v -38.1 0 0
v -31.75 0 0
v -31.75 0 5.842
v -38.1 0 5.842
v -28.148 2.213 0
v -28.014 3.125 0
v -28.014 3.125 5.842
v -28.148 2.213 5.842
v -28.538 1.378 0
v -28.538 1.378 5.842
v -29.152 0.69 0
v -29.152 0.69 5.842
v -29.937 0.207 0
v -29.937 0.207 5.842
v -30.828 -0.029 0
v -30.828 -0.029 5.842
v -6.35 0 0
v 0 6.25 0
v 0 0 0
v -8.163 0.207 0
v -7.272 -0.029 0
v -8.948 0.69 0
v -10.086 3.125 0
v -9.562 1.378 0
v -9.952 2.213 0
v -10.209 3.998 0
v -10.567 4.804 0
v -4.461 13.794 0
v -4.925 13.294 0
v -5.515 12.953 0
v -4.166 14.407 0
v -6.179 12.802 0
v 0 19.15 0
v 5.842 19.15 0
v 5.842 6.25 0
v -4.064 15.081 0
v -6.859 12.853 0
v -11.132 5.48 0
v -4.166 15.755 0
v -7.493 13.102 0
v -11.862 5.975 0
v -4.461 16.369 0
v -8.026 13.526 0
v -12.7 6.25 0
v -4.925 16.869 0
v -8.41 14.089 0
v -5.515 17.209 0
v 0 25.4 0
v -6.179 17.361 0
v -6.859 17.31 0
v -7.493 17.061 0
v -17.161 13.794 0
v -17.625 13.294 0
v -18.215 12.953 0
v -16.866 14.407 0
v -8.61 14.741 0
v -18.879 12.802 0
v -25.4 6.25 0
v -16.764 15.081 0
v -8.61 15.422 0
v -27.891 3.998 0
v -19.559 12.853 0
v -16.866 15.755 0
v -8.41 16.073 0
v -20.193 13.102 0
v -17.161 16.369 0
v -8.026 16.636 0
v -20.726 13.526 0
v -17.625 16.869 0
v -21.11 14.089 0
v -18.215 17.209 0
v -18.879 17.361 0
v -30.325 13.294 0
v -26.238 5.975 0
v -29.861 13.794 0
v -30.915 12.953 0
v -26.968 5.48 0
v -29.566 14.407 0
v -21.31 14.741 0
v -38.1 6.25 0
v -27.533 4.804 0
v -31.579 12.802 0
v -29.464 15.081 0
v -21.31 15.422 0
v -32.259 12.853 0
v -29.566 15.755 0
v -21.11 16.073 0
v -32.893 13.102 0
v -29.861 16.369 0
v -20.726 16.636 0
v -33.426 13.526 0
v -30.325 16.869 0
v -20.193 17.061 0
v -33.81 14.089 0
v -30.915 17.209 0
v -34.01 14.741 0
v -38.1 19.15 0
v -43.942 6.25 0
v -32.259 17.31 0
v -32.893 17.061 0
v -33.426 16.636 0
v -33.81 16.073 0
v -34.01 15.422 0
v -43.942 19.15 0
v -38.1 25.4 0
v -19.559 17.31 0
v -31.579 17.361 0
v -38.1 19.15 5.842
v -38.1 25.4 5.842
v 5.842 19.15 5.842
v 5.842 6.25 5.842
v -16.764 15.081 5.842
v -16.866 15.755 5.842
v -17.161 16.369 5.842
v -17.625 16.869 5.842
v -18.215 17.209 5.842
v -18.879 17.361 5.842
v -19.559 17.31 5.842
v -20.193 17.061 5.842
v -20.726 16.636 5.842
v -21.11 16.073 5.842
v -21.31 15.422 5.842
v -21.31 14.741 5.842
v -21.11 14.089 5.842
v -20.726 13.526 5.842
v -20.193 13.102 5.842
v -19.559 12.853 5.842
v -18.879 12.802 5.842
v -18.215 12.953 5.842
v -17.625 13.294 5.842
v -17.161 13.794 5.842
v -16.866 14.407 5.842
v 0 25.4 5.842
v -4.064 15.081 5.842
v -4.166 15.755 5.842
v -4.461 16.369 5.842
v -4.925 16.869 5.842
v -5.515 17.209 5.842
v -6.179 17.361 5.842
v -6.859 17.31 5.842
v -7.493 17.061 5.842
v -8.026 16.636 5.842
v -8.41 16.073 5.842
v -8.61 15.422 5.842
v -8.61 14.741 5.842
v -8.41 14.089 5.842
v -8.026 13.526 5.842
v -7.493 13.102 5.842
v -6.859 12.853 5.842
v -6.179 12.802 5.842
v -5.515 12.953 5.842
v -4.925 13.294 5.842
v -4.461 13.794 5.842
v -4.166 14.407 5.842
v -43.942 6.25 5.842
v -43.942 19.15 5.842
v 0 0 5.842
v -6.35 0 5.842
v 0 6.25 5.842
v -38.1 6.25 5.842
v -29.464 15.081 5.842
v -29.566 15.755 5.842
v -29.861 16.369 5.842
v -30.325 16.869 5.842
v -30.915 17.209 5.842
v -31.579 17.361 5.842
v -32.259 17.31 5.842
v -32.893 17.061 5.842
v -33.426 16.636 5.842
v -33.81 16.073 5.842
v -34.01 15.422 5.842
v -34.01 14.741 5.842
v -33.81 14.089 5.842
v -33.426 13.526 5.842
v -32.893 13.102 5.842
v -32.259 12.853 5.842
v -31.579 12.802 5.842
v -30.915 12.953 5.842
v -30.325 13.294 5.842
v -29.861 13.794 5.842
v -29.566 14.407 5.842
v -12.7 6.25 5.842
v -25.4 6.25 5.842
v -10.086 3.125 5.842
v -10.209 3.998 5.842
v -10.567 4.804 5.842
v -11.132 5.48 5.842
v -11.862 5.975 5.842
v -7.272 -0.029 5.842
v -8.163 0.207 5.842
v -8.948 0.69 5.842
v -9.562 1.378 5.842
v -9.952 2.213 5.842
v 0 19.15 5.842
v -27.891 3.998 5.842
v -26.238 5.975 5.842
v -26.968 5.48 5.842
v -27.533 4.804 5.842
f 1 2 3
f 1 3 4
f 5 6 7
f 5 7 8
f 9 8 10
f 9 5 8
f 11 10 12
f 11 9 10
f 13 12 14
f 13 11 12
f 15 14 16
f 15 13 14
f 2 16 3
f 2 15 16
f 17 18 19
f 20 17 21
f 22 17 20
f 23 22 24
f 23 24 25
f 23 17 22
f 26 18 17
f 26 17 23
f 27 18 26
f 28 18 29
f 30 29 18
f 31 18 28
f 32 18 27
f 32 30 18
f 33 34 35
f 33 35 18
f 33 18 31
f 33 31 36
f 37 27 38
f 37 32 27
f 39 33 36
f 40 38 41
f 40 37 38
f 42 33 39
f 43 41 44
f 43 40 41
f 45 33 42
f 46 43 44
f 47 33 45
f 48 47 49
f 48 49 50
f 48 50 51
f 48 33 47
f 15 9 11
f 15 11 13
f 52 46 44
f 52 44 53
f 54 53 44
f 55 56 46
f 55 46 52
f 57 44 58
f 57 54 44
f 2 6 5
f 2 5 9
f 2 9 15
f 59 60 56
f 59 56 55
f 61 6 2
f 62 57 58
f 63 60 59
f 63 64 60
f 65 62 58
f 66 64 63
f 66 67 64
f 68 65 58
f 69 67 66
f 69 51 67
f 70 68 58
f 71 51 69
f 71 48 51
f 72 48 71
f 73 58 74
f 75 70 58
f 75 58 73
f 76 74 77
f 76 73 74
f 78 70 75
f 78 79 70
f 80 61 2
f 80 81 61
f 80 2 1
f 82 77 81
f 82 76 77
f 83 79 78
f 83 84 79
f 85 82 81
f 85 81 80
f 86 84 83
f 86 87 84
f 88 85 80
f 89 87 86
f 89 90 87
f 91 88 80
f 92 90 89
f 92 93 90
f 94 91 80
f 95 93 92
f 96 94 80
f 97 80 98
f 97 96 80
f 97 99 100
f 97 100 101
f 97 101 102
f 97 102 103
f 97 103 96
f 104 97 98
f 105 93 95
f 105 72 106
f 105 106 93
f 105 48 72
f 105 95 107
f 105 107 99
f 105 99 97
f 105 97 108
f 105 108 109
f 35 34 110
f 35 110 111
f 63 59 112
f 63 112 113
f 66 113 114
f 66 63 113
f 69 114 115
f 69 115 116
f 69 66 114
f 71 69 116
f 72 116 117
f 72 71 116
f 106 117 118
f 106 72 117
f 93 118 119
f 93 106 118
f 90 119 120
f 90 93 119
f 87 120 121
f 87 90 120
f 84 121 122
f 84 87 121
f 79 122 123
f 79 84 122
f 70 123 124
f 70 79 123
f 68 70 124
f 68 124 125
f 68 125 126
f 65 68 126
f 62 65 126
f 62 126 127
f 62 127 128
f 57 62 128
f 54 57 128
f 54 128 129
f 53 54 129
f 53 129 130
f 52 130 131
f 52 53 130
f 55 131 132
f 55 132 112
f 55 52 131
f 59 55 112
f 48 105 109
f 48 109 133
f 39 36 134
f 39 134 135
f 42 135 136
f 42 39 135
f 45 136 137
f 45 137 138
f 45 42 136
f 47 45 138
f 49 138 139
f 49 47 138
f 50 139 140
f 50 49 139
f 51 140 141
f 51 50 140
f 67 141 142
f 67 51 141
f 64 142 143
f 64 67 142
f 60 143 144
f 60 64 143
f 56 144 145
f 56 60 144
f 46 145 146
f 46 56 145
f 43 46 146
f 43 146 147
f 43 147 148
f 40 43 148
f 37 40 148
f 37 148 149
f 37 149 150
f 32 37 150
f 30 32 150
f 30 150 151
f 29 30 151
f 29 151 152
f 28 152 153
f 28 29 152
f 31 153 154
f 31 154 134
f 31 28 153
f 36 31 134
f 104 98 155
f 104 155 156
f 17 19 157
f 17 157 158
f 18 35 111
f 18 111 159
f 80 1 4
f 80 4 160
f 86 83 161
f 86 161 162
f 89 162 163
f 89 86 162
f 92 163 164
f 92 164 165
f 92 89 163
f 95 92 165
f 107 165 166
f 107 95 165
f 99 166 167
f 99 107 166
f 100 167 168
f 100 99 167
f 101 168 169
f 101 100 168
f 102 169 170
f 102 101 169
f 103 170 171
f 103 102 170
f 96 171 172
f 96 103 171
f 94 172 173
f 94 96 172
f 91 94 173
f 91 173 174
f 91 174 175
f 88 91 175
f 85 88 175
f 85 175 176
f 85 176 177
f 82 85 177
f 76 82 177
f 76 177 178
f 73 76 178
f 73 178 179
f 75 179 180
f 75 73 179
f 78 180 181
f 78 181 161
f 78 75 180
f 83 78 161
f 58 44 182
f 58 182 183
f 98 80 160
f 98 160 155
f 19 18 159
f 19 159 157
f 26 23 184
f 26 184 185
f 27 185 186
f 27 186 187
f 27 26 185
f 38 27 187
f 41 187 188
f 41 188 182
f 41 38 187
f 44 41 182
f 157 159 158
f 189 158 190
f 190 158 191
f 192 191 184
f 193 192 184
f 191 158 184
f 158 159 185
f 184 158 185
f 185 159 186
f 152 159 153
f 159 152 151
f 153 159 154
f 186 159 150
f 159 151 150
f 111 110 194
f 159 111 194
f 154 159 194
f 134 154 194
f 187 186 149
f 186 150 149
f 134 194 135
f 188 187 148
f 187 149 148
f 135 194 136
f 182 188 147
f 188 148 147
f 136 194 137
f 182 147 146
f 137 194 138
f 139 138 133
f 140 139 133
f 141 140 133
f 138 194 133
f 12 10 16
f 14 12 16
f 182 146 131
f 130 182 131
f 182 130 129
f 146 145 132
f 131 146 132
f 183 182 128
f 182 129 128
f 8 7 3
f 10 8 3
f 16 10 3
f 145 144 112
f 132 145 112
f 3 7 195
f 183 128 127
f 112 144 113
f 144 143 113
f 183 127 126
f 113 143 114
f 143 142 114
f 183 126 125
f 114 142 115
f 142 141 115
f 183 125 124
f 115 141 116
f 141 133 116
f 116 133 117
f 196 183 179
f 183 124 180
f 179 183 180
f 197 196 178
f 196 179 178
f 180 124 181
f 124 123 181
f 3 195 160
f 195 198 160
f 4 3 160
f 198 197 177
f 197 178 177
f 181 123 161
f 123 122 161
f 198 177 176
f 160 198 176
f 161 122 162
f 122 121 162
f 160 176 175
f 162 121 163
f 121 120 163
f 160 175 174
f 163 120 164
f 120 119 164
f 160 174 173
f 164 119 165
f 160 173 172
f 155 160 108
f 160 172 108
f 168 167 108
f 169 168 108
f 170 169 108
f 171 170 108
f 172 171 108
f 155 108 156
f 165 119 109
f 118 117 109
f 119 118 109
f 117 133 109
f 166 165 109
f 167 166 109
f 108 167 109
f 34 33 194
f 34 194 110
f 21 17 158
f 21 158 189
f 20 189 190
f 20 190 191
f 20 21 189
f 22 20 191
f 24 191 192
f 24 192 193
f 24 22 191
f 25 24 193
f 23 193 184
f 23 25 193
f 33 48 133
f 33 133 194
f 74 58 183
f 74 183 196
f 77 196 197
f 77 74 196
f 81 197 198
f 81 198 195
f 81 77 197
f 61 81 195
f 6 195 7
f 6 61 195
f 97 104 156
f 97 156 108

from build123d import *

# Parameters (mm, degrees)
SKETCH1_R           = 2.286
BOSS_EXTRUDE1_DEPTH = 5.842


with BuildPart() as part:
    # Sketch1 → Boss-Extrude1 (new body)
    with BuildSketch(Plane.XY):
        with BuildLine():
            Line((0, 0), (-6.35, 0))
            ThreePointArc((-6.35, 0), (-8.948239117, 0.689575054), (-10.086248608, 3.125))
            ThreePointArc((-10.086248608, 3.125), (-10.825823663, 5.161990509), (-12.7, 6.25))
            Line((-12.7, 6.25), (-25.4, 6.25))
            ThreePointArc((-25.4, 6.25), (-27.274176337, 5.161990509), (-28.013751392, 3.125))
            ThreePointArc((-28.013751392, 3.125), (-29.151760883, 0.689575054), (-31.75, 0))
            Line((-31.75, 0), (-38.1, 0))
            Line((-38.1, 0), (-38.1, 6.25))
            Line((-38.1, 6.25), (-43.942, 6.25))
            Line((-43.942, 6.25), (-43.942, 19.15))
            Line((-43.942, 19.15), (-38.1, 19.15))
            Line((-38.1, 19.15), (-38.1, 25.4))
            Line((-38.1, 25.4), (0, 25.4))
            Line((0, 25.4), (0, 19.15))
            Line((0, 19.15), (5.842, 19.15))
            Line((5.842, 19.15), (5.842, 6.25))
            Line((5.842, 6.25), (0, 6.25))
            Line((0, 6.25), (0, 0))
        make_face()
        with Locations((-6.35, 15.08125)):
            Circle(SKETCH1_R, mode=Mode.SUBTRACT)
        with Locations((-19.05, 15.08125)):
            Circle(SKETCH1_R, mode=Mode.SUBTRACT)
        with Locations((-31.75, 15.08125)):
            Circle(SKETCH1_R, mode=Mode.SUBTRACT)
    extrude(amount=BOSS_EXTRUDE1_DEPTH)


solid = part.part
